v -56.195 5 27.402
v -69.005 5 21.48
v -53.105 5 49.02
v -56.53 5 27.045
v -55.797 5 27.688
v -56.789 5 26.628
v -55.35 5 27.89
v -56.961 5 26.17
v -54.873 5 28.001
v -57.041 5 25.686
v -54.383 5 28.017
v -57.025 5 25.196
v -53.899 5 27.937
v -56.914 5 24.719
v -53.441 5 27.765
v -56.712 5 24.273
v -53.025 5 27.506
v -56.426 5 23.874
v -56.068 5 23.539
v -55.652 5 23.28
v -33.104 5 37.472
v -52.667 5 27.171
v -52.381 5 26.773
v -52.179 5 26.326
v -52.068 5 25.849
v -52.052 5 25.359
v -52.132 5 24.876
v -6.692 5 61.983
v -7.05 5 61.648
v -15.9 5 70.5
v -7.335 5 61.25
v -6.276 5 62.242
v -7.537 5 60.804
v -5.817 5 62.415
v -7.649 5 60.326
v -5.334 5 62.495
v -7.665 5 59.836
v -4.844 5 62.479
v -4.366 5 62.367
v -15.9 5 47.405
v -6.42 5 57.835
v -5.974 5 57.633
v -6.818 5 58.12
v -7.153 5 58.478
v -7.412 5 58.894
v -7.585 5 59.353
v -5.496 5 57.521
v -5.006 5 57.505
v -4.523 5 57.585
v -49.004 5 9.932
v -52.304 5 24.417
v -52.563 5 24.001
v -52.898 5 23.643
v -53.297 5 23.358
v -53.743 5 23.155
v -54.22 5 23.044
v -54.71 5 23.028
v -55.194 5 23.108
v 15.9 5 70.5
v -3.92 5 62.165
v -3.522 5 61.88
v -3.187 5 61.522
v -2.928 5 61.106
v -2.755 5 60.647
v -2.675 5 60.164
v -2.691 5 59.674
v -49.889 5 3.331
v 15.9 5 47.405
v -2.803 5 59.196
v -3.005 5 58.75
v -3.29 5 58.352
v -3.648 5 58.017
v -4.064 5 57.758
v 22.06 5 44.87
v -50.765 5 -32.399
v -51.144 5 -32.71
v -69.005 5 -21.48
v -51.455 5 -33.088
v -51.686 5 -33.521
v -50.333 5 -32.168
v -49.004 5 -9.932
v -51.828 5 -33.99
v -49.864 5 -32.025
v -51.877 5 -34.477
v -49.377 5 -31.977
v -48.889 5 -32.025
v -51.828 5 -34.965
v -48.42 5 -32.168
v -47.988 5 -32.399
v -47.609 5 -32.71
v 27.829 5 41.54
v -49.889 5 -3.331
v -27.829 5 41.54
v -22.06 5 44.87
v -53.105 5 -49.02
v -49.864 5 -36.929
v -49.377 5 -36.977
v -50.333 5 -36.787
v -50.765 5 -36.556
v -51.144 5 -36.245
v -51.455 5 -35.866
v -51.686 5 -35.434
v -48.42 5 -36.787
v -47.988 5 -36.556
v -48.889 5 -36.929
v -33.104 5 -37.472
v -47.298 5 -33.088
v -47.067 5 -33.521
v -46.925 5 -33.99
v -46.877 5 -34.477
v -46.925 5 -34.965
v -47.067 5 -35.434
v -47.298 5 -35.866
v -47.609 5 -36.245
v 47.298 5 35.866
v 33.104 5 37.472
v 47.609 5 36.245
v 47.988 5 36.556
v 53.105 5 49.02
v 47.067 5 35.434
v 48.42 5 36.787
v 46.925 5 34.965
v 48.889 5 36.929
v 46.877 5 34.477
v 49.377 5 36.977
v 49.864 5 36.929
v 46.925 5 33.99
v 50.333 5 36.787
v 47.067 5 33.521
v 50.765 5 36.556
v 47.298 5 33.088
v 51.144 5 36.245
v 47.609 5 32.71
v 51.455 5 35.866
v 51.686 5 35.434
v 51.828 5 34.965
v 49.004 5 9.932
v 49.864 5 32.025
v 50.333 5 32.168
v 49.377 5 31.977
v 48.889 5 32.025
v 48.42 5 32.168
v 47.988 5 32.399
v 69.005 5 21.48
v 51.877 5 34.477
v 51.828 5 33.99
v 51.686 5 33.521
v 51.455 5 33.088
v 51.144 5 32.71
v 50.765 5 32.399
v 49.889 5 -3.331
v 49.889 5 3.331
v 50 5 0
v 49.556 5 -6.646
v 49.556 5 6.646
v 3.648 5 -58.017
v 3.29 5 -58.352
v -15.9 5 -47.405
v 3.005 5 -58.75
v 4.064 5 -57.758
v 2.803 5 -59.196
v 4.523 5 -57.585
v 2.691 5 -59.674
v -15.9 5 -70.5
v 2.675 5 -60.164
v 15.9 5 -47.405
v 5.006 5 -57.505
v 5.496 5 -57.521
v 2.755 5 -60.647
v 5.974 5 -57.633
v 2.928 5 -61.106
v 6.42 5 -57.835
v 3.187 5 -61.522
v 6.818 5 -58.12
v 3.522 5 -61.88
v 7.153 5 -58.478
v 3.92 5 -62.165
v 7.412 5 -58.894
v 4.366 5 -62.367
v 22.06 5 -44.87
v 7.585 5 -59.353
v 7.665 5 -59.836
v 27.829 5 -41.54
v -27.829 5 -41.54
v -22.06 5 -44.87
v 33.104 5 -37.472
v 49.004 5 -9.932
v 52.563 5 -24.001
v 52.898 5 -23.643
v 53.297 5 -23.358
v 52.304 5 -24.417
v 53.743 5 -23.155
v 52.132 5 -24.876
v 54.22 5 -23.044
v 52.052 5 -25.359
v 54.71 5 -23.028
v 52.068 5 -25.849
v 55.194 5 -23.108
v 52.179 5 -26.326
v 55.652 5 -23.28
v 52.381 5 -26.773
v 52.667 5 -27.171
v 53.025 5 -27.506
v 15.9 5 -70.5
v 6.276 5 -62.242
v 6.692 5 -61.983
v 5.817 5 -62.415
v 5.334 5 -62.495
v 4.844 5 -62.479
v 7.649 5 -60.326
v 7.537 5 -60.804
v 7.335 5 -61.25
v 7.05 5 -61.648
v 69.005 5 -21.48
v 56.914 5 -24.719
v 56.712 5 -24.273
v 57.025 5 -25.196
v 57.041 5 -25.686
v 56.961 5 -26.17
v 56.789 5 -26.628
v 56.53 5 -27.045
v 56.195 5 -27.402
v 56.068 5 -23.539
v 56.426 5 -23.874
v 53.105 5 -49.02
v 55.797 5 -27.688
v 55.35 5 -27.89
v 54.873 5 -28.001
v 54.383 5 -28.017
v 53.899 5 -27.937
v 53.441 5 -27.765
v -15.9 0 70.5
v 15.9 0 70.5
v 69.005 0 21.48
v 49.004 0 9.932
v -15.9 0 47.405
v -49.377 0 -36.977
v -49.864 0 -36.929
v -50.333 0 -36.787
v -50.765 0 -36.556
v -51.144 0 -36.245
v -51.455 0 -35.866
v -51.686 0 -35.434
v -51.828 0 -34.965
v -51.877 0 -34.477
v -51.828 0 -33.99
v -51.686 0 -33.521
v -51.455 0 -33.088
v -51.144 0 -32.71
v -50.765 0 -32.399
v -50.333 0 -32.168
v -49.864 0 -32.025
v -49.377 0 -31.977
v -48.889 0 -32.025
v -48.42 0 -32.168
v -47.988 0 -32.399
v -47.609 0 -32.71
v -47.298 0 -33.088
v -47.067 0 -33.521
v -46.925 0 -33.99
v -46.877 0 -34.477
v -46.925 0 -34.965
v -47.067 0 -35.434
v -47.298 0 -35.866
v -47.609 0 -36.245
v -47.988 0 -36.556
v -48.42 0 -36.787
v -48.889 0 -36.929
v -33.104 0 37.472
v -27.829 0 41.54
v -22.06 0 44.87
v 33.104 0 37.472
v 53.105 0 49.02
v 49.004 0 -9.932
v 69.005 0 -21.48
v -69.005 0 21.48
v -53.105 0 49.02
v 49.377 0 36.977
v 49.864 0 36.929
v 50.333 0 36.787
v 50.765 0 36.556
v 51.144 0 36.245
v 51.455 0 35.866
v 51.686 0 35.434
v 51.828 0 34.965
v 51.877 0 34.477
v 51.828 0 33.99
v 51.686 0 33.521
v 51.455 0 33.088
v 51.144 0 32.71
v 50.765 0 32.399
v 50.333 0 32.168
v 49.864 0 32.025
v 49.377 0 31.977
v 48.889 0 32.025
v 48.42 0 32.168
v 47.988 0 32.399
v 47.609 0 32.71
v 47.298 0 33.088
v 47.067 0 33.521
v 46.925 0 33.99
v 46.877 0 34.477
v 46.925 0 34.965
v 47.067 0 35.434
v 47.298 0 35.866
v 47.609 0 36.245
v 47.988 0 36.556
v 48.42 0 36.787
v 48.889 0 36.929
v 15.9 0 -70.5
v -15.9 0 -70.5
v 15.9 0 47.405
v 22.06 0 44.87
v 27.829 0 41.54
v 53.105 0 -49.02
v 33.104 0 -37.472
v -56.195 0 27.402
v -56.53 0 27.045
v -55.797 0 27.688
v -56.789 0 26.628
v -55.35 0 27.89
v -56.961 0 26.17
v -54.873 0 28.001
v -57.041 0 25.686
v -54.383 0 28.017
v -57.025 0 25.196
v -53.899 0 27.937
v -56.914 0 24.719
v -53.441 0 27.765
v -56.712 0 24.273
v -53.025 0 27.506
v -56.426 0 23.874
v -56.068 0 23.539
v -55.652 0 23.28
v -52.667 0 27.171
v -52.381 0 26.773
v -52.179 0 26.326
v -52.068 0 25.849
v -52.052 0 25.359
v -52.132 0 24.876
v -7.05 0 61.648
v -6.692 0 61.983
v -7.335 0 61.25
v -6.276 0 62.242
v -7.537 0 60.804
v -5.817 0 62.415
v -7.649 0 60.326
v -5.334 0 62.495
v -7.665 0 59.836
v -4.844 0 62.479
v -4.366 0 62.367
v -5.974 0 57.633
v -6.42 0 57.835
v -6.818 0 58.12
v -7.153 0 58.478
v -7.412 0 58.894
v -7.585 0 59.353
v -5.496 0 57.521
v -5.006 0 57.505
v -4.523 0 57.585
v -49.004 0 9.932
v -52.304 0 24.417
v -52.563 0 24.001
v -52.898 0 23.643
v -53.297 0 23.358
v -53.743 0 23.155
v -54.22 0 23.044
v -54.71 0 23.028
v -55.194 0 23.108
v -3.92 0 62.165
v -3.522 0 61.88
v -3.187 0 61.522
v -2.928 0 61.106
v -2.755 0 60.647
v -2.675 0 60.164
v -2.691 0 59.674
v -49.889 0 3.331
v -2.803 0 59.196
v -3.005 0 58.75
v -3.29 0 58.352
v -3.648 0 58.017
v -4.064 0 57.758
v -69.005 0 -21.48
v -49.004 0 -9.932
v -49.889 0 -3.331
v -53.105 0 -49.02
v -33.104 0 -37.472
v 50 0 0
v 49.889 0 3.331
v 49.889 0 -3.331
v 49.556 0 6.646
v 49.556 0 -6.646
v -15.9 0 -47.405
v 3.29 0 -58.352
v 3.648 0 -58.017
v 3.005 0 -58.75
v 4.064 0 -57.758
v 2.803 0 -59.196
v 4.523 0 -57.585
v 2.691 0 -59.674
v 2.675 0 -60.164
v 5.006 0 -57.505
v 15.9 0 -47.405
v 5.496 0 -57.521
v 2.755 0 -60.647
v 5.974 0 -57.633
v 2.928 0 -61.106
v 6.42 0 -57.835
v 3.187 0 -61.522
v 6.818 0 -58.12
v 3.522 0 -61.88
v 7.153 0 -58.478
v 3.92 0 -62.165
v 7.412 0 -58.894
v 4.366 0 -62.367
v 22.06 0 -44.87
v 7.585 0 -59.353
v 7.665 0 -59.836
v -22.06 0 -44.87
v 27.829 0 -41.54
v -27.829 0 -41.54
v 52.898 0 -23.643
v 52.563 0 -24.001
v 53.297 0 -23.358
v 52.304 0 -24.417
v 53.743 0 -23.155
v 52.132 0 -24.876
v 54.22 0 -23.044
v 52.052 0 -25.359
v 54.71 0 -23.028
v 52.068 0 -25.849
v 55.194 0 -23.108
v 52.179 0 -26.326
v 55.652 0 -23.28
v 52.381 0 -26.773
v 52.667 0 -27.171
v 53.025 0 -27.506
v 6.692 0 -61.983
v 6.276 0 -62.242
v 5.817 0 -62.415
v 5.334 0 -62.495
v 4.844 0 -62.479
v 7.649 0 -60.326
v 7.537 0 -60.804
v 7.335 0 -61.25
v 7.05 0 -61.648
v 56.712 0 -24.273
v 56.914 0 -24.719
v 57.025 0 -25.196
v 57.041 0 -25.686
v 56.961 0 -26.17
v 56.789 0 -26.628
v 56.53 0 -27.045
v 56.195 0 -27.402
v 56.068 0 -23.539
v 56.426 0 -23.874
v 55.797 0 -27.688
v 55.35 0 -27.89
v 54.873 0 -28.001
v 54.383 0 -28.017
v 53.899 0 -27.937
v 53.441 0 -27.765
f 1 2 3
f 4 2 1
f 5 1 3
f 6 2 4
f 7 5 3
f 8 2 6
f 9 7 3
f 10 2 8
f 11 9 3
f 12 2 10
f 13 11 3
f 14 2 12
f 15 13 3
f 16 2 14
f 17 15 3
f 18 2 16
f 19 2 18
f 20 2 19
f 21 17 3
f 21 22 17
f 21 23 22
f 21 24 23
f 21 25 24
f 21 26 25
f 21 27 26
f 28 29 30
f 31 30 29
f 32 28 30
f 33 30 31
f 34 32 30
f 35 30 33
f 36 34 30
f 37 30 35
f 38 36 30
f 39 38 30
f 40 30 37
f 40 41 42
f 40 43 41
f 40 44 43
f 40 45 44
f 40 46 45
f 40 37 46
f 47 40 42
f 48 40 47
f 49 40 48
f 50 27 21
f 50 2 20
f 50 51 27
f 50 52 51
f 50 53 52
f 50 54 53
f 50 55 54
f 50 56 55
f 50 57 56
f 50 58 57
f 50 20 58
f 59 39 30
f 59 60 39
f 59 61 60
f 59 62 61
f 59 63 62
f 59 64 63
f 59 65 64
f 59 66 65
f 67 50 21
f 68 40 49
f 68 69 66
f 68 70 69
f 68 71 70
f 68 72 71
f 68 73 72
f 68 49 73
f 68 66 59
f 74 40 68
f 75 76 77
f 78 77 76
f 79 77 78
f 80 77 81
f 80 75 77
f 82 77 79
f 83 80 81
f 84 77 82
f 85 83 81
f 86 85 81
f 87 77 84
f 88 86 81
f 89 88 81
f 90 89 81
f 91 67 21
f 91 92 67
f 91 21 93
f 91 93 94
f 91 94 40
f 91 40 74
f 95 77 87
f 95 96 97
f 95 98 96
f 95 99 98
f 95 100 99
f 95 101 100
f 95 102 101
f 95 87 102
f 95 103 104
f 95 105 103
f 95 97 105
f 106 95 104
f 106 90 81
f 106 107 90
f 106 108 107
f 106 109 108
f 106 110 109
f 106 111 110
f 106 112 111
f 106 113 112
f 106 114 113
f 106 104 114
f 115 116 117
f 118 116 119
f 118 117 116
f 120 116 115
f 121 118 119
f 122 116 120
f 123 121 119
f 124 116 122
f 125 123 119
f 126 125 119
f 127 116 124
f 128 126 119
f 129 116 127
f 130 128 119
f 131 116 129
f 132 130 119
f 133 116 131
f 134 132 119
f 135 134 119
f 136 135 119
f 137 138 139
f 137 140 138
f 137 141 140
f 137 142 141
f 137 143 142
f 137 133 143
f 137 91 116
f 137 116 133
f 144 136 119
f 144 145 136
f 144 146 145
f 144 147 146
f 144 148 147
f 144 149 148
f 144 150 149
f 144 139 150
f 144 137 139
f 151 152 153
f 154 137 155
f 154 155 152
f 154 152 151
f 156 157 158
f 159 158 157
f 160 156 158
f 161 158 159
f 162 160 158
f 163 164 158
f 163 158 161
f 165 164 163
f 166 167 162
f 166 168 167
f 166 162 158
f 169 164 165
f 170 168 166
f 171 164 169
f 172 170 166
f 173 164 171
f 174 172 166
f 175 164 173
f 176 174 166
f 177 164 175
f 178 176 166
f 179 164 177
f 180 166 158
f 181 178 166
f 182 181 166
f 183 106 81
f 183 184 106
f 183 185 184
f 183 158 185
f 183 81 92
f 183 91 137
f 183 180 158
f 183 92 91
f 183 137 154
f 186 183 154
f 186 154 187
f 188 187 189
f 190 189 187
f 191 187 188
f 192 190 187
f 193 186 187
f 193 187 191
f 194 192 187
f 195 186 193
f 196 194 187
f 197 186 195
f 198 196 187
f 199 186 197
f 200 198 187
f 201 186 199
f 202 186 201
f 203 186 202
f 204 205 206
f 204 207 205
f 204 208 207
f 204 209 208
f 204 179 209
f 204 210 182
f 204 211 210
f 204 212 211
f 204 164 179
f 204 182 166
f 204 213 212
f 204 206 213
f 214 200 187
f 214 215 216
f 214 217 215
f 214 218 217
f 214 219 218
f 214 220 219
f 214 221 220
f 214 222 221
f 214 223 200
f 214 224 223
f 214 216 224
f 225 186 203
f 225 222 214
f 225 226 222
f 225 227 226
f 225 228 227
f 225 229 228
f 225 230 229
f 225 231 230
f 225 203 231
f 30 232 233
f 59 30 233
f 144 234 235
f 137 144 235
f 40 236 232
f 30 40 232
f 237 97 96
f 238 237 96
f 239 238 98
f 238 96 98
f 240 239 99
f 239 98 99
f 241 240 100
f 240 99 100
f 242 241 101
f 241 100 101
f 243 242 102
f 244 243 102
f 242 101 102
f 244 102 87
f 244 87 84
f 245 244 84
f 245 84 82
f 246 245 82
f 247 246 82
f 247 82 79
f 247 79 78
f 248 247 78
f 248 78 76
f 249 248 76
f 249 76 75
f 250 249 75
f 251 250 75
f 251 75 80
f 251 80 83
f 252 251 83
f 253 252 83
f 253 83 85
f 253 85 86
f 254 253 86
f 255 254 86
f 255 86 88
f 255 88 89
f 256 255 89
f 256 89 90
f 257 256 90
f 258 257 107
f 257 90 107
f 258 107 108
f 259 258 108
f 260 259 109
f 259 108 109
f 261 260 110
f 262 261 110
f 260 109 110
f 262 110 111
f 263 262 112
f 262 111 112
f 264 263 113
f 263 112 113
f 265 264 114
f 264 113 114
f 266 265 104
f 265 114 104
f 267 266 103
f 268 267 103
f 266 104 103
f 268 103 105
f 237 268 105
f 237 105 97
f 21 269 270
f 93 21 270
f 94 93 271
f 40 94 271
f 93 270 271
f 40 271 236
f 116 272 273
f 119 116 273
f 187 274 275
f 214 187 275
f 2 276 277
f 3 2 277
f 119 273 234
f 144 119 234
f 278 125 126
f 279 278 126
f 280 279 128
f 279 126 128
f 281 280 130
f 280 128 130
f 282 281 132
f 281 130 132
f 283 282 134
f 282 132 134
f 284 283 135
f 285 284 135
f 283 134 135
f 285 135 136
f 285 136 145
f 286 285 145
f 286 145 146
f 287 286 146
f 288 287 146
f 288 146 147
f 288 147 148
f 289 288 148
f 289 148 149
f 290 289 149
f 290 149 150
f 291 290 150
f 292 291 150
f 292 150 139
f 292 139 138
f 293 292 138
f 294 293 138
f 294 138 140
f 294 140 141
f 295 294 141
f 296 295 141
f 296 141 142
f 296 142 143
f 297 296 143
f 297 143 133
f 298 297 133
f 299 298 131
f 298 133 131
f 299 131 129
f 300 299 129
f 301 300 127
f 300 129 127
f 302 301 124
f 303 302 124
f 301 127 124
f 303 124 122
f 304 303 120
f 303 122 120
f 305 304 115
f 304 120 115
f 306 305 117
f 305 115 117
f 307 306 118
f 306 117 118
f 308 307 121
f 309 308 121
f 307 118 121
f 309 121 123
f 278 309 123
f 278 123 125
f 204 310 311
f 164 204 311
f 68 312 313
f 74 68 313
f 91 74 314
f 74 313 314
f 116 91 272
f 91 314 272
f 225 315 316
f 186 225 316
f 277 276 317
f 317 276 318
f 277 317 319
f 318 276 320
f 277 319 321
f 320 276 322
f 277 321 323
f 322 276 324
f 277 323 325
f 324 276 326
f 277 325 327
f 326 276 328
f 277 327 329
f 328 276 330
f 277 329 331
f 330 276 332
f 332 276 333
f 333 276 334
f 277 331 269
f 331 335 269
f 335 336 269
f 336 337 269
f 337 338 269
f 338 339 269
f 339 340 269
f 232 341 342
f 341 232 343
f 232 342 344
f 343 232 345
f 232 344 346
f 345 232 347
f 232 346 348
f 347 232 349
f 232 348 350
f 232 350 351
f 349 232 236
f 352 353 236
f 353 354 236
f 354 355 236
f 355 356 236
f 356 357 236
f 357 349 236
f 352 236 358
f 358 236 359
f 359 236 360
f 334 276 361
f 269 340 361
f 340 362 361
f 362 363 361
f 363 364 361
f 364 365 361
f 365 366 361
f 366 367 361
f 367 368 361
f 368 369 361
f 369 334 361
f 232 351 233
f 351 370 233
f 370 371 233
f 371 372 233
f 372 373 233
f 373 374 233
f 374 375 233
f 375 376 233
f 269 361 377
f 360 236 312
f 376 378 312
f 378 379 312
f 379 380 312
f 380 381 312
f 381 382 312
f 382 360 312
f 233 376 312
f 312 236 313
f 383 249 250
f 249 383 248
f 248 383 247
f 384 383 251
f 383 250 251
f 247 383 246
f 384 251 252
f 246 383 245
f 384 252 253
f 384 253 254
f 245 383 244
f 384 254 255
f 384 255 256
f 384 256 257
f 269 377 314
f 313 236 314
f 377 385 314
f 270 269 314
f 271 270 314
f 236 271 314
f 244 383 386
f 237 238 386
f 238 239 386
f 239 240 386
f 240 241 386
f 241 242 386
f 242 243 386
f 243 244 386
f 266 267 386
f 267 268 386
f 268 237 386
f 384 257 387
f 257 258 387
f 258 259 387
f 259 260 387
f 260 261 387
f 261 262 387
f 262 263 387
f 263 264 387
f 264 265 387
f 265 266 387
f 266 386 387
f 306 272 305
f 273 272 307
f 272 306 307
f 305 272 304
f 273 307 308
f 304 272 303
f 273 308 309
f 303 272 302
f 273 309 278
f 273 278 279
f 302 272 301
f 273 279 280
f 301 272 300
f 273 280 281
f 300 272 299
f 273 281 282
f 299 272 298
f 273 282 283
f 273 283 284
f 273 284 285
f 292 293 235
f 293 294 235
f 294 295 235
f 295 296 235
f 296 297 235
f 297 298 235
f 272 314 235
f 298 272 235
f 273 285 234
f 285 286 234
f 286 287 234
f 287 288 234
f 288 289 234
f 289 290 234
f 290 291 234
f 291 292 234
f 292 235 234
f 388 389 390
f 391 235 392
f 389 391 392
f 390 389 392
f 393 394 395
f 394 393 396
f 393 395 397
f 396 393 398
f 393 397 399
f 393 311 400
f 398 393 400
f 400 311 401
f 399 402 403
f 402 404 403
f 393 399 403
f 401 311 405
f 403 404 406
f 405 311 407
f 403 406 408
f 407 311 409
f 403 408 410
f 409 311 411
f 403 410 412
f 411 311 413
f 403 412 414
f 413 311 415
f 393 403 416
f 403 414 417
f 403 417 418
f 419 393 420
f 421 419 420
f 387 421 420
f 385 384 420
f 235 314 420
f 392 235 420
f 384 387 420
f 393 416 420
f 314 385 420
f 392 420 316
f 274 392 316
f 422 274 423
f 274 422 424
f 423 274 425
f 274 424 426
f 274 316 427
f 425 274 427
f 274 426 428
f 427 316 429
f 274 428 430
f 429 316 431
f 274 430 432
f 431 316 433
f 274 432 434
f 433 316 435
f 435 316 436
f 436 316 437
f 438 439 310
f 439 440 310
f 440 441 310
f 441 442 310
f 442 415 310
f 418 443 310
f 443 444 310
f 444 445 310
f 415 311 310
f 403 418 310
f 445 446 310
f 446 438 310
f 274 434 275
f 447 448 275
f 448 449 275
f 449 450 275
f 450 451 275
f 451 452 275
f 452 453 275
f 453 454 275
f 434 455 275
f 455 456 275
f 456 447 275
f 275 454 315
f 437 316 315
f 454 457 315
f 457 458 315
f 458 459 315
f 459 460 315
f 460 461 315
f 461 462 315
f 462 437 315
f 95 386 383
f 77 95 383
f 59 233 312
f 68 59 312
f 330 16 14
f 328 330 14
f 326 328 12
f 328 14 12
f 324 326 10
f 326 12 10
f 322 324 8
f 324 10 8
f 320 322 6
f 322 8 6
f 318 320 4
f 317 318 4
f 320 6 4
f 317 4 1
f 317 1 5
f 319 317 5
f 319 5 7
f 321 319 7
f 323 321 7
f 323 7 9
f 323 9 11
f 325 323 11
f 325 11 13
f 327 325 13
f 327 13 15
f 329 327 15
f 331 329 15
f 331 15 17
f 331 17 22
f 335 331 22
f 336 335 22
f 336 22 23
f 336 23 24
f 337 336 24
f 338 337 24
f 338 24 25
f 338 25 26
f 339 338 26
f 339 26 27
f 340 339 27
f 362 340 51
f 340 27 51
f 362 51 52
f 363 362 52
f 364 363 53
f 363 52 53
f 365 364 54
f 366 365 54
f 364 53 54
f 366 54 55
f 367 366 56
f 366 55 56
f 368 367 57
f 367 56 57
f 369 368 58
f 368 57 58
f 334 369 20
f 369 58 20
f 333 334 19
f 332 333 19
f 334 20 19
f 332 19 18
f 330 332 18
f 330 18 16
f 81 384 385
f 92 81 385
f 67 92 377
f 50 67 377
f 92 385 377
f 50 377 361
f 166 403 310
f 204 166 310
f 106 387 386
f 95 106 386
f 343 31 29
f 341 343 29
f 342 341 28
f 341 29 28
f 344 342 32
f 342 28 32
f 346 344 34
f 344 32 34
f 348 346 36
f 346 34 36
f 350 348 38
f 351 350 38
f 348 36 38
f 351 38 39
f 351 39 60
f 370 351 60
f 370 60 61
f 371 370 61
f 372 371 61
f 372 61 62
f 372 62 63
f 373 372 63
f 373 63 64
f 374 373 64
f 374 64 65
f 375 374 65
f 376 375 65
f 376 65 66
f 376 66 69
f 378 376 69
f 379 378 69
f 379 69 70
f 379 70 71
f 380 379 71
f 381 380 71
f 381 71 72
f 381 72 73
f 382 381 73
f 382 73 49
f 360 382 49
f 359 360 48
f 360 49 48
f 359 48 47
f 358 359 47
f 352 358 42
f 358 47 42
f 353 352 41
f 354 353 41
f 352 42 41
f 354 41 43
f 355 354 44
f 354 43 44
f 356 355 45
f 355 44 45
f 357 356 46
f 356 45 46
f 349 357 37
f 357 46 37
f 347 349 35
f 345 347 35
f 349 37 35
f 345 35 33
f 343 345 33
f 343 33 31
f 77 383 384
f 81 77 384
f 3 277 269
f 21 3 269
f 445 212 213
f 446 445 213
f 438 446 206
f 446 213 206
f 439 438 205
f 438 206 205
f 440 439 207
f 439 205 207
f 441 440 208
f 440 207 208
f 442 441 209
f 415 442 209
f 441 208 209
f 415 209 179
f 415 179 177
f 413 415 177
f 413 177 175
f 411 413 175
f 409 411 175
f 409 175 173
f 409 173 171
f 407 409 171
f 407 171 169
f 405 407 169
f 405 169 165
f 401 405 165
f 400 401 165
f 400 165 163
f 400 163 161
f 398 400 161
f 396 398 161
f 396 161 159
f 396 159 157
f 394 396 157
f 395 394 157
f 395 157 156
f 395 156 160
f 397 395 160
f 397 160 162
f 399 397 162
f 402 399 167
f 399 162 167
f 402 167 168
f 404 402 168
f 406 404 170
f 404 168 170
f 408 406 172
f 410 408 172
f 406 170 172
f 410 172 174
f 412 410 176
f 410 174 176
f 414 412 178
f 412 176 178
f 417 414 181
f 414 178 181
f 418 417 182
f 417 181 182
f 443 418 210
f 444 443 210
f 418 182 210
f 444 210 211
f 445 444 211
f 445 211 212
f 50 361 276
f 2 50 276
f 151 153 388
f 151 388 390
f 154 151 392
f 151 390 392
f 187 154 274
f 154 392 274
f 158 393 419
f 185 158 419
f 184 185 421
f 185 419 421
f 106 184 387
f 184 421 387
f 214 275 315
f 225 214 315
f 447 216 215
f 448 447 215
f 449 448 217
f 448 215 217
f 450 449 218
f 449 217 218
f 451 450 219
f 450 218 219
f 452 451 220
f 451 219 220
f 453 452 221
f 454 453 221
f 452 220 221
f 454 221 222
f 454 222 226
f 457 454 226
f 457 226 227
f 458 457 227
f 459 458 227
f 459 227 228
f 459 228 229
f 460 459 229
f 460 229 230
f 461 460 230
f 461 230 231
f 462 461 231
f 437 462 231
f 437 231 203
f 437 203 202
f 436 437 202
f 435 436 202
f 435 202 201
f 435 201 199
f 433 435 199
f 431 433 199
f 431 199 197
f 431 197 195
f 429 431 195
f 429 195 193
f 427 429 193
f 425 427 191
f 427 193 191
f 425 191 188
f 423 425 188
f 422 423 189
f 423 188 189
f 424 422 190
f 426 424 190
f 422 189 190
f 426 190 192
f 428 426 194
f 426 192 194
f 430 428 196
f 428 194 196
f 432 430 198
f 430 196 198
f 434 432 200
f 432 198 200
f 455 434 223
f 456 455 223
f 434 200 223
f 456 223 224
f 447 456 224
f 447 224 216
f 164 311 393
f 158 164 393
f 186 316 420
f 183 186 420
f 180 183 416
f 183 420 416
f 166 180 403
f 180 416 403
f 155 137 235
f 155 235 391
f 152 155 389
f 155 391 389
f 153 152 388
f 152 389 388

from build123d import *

# Parameters (mm, degrees)
BOSS_EXTRUDE1_DEPTH = 5
CIRPATTERN1_COUNT   = 3
CIRPATTERN1_ANGLE   = 120
SKETCH2_R           = 2.5
CUT_EXTRUDE1_DEPTH  = 99.777078193
CIRPATTERN2_COUNT   = 6


with BuildPart() as part:
    # Sketch1 → Boss-Extrude1 (new body)
    with BuildSketch(Plane(origin=(0, 0, 0), x_dir=(1, 0, 0), z_dir=(0, 1, 0))):
        with BuildLine():
            ThreePointArc((-15.9, 47.404535648), (-50, 0), (-15.9, -47.404535648))
            Line((-15.9, -47.404535648), (-15.9, 47.404535648))
        make_face()
        with BuildLine():
            ThreePointArc((-15.9, -47.404535648), (0, -50), (15.9, -47.404535648))
            Line((15.9, -47.404535648), (15.9, 47.404535648))
            ThreePointArc((15.9, 47.404535648), (0, 50), (-15.9, 47.404535648))
            Line((-15.9, 47.404535648), (-15.9, -47.404535648))
        make_face()
        with BuildLine():
            Line((-15.9, -70.5), (15.9, -70.5))
            Line((15.9, -70.5), (15.9, -47.404535648))
            ThreePointArc((15.9, -47.404535648), (0, -50), (-15.9, -47.404535648))
            Line((-15.9, -47.404535648), (-15.9, -70.5))
        make_face()
        with BuildLine():
            ThreePointArc((-15.9, 47.404535648), (0, 50), (15.9, 47.404535648))
            Line((15.9, 47.404535648), (15.9, 70.5))
            Line((15.9, 70.5), (-15.9, 70.5))
            Line((-15.9, 70.5), (-15.9, 47.404535648))
        make_face()
        with BuildLine():
            Line((15.9, 47.404535648), (15.9, -47.404535648))
            ThreePointArc((15.9, -47.404535648), (40.589407485, -29.197602641), (50, 0))
            ThreePointArc((50, 0), (40.589407485, 29.197602641), (15.9, 47.404535648))
        make_face()
    boss_extrude1 = extrude(amount=BOSS_EXTRUDE1_DEPTH)

    # CirPattern1: Boss-Extrude1 ×3 about axis
    cirpattern1_axis = Axis((0, 0, 0), (0, 1, 0))
    for i in range(1, CIRPATTERN1_COUNT):
        add(boss_extrude1.rotate(cirpattern1_axis, i * CIRPATTERN1_ANGLE / (CIRPATTERN1_COUNT - 1)))

    # Sketch2 → Cut-Extrude1 (cut, through all)
    with BuildSketch(Plane(origin=(0, 5, 0), x_dir=(1, 0, 0), z_dir=(0, 1, 0))):
        with Locations(Location((49.376524227, -34.477351338, 0), (0, 0, 270))):
            Circle(SKETCH2_R)
    cut_extrude1 = extrude(amount=-CUT_EXTRUDE1_DEPTH, mode=Mode.SUBTRACT)

    # CirPattern2: Cut-Extrude1 ×6 about axis
    cirpattern2_axis = Axis((0, 0, 0), (0, 1, 0))
    for i in range(1, CIRPATTERN2_COUNT):
        add(cut_extrude1.rotate(cirpattern2_axis, i * 360 / CIRPATTERN2_COUNT), mode=Mode.SUBTRACT)


solid = part.part
